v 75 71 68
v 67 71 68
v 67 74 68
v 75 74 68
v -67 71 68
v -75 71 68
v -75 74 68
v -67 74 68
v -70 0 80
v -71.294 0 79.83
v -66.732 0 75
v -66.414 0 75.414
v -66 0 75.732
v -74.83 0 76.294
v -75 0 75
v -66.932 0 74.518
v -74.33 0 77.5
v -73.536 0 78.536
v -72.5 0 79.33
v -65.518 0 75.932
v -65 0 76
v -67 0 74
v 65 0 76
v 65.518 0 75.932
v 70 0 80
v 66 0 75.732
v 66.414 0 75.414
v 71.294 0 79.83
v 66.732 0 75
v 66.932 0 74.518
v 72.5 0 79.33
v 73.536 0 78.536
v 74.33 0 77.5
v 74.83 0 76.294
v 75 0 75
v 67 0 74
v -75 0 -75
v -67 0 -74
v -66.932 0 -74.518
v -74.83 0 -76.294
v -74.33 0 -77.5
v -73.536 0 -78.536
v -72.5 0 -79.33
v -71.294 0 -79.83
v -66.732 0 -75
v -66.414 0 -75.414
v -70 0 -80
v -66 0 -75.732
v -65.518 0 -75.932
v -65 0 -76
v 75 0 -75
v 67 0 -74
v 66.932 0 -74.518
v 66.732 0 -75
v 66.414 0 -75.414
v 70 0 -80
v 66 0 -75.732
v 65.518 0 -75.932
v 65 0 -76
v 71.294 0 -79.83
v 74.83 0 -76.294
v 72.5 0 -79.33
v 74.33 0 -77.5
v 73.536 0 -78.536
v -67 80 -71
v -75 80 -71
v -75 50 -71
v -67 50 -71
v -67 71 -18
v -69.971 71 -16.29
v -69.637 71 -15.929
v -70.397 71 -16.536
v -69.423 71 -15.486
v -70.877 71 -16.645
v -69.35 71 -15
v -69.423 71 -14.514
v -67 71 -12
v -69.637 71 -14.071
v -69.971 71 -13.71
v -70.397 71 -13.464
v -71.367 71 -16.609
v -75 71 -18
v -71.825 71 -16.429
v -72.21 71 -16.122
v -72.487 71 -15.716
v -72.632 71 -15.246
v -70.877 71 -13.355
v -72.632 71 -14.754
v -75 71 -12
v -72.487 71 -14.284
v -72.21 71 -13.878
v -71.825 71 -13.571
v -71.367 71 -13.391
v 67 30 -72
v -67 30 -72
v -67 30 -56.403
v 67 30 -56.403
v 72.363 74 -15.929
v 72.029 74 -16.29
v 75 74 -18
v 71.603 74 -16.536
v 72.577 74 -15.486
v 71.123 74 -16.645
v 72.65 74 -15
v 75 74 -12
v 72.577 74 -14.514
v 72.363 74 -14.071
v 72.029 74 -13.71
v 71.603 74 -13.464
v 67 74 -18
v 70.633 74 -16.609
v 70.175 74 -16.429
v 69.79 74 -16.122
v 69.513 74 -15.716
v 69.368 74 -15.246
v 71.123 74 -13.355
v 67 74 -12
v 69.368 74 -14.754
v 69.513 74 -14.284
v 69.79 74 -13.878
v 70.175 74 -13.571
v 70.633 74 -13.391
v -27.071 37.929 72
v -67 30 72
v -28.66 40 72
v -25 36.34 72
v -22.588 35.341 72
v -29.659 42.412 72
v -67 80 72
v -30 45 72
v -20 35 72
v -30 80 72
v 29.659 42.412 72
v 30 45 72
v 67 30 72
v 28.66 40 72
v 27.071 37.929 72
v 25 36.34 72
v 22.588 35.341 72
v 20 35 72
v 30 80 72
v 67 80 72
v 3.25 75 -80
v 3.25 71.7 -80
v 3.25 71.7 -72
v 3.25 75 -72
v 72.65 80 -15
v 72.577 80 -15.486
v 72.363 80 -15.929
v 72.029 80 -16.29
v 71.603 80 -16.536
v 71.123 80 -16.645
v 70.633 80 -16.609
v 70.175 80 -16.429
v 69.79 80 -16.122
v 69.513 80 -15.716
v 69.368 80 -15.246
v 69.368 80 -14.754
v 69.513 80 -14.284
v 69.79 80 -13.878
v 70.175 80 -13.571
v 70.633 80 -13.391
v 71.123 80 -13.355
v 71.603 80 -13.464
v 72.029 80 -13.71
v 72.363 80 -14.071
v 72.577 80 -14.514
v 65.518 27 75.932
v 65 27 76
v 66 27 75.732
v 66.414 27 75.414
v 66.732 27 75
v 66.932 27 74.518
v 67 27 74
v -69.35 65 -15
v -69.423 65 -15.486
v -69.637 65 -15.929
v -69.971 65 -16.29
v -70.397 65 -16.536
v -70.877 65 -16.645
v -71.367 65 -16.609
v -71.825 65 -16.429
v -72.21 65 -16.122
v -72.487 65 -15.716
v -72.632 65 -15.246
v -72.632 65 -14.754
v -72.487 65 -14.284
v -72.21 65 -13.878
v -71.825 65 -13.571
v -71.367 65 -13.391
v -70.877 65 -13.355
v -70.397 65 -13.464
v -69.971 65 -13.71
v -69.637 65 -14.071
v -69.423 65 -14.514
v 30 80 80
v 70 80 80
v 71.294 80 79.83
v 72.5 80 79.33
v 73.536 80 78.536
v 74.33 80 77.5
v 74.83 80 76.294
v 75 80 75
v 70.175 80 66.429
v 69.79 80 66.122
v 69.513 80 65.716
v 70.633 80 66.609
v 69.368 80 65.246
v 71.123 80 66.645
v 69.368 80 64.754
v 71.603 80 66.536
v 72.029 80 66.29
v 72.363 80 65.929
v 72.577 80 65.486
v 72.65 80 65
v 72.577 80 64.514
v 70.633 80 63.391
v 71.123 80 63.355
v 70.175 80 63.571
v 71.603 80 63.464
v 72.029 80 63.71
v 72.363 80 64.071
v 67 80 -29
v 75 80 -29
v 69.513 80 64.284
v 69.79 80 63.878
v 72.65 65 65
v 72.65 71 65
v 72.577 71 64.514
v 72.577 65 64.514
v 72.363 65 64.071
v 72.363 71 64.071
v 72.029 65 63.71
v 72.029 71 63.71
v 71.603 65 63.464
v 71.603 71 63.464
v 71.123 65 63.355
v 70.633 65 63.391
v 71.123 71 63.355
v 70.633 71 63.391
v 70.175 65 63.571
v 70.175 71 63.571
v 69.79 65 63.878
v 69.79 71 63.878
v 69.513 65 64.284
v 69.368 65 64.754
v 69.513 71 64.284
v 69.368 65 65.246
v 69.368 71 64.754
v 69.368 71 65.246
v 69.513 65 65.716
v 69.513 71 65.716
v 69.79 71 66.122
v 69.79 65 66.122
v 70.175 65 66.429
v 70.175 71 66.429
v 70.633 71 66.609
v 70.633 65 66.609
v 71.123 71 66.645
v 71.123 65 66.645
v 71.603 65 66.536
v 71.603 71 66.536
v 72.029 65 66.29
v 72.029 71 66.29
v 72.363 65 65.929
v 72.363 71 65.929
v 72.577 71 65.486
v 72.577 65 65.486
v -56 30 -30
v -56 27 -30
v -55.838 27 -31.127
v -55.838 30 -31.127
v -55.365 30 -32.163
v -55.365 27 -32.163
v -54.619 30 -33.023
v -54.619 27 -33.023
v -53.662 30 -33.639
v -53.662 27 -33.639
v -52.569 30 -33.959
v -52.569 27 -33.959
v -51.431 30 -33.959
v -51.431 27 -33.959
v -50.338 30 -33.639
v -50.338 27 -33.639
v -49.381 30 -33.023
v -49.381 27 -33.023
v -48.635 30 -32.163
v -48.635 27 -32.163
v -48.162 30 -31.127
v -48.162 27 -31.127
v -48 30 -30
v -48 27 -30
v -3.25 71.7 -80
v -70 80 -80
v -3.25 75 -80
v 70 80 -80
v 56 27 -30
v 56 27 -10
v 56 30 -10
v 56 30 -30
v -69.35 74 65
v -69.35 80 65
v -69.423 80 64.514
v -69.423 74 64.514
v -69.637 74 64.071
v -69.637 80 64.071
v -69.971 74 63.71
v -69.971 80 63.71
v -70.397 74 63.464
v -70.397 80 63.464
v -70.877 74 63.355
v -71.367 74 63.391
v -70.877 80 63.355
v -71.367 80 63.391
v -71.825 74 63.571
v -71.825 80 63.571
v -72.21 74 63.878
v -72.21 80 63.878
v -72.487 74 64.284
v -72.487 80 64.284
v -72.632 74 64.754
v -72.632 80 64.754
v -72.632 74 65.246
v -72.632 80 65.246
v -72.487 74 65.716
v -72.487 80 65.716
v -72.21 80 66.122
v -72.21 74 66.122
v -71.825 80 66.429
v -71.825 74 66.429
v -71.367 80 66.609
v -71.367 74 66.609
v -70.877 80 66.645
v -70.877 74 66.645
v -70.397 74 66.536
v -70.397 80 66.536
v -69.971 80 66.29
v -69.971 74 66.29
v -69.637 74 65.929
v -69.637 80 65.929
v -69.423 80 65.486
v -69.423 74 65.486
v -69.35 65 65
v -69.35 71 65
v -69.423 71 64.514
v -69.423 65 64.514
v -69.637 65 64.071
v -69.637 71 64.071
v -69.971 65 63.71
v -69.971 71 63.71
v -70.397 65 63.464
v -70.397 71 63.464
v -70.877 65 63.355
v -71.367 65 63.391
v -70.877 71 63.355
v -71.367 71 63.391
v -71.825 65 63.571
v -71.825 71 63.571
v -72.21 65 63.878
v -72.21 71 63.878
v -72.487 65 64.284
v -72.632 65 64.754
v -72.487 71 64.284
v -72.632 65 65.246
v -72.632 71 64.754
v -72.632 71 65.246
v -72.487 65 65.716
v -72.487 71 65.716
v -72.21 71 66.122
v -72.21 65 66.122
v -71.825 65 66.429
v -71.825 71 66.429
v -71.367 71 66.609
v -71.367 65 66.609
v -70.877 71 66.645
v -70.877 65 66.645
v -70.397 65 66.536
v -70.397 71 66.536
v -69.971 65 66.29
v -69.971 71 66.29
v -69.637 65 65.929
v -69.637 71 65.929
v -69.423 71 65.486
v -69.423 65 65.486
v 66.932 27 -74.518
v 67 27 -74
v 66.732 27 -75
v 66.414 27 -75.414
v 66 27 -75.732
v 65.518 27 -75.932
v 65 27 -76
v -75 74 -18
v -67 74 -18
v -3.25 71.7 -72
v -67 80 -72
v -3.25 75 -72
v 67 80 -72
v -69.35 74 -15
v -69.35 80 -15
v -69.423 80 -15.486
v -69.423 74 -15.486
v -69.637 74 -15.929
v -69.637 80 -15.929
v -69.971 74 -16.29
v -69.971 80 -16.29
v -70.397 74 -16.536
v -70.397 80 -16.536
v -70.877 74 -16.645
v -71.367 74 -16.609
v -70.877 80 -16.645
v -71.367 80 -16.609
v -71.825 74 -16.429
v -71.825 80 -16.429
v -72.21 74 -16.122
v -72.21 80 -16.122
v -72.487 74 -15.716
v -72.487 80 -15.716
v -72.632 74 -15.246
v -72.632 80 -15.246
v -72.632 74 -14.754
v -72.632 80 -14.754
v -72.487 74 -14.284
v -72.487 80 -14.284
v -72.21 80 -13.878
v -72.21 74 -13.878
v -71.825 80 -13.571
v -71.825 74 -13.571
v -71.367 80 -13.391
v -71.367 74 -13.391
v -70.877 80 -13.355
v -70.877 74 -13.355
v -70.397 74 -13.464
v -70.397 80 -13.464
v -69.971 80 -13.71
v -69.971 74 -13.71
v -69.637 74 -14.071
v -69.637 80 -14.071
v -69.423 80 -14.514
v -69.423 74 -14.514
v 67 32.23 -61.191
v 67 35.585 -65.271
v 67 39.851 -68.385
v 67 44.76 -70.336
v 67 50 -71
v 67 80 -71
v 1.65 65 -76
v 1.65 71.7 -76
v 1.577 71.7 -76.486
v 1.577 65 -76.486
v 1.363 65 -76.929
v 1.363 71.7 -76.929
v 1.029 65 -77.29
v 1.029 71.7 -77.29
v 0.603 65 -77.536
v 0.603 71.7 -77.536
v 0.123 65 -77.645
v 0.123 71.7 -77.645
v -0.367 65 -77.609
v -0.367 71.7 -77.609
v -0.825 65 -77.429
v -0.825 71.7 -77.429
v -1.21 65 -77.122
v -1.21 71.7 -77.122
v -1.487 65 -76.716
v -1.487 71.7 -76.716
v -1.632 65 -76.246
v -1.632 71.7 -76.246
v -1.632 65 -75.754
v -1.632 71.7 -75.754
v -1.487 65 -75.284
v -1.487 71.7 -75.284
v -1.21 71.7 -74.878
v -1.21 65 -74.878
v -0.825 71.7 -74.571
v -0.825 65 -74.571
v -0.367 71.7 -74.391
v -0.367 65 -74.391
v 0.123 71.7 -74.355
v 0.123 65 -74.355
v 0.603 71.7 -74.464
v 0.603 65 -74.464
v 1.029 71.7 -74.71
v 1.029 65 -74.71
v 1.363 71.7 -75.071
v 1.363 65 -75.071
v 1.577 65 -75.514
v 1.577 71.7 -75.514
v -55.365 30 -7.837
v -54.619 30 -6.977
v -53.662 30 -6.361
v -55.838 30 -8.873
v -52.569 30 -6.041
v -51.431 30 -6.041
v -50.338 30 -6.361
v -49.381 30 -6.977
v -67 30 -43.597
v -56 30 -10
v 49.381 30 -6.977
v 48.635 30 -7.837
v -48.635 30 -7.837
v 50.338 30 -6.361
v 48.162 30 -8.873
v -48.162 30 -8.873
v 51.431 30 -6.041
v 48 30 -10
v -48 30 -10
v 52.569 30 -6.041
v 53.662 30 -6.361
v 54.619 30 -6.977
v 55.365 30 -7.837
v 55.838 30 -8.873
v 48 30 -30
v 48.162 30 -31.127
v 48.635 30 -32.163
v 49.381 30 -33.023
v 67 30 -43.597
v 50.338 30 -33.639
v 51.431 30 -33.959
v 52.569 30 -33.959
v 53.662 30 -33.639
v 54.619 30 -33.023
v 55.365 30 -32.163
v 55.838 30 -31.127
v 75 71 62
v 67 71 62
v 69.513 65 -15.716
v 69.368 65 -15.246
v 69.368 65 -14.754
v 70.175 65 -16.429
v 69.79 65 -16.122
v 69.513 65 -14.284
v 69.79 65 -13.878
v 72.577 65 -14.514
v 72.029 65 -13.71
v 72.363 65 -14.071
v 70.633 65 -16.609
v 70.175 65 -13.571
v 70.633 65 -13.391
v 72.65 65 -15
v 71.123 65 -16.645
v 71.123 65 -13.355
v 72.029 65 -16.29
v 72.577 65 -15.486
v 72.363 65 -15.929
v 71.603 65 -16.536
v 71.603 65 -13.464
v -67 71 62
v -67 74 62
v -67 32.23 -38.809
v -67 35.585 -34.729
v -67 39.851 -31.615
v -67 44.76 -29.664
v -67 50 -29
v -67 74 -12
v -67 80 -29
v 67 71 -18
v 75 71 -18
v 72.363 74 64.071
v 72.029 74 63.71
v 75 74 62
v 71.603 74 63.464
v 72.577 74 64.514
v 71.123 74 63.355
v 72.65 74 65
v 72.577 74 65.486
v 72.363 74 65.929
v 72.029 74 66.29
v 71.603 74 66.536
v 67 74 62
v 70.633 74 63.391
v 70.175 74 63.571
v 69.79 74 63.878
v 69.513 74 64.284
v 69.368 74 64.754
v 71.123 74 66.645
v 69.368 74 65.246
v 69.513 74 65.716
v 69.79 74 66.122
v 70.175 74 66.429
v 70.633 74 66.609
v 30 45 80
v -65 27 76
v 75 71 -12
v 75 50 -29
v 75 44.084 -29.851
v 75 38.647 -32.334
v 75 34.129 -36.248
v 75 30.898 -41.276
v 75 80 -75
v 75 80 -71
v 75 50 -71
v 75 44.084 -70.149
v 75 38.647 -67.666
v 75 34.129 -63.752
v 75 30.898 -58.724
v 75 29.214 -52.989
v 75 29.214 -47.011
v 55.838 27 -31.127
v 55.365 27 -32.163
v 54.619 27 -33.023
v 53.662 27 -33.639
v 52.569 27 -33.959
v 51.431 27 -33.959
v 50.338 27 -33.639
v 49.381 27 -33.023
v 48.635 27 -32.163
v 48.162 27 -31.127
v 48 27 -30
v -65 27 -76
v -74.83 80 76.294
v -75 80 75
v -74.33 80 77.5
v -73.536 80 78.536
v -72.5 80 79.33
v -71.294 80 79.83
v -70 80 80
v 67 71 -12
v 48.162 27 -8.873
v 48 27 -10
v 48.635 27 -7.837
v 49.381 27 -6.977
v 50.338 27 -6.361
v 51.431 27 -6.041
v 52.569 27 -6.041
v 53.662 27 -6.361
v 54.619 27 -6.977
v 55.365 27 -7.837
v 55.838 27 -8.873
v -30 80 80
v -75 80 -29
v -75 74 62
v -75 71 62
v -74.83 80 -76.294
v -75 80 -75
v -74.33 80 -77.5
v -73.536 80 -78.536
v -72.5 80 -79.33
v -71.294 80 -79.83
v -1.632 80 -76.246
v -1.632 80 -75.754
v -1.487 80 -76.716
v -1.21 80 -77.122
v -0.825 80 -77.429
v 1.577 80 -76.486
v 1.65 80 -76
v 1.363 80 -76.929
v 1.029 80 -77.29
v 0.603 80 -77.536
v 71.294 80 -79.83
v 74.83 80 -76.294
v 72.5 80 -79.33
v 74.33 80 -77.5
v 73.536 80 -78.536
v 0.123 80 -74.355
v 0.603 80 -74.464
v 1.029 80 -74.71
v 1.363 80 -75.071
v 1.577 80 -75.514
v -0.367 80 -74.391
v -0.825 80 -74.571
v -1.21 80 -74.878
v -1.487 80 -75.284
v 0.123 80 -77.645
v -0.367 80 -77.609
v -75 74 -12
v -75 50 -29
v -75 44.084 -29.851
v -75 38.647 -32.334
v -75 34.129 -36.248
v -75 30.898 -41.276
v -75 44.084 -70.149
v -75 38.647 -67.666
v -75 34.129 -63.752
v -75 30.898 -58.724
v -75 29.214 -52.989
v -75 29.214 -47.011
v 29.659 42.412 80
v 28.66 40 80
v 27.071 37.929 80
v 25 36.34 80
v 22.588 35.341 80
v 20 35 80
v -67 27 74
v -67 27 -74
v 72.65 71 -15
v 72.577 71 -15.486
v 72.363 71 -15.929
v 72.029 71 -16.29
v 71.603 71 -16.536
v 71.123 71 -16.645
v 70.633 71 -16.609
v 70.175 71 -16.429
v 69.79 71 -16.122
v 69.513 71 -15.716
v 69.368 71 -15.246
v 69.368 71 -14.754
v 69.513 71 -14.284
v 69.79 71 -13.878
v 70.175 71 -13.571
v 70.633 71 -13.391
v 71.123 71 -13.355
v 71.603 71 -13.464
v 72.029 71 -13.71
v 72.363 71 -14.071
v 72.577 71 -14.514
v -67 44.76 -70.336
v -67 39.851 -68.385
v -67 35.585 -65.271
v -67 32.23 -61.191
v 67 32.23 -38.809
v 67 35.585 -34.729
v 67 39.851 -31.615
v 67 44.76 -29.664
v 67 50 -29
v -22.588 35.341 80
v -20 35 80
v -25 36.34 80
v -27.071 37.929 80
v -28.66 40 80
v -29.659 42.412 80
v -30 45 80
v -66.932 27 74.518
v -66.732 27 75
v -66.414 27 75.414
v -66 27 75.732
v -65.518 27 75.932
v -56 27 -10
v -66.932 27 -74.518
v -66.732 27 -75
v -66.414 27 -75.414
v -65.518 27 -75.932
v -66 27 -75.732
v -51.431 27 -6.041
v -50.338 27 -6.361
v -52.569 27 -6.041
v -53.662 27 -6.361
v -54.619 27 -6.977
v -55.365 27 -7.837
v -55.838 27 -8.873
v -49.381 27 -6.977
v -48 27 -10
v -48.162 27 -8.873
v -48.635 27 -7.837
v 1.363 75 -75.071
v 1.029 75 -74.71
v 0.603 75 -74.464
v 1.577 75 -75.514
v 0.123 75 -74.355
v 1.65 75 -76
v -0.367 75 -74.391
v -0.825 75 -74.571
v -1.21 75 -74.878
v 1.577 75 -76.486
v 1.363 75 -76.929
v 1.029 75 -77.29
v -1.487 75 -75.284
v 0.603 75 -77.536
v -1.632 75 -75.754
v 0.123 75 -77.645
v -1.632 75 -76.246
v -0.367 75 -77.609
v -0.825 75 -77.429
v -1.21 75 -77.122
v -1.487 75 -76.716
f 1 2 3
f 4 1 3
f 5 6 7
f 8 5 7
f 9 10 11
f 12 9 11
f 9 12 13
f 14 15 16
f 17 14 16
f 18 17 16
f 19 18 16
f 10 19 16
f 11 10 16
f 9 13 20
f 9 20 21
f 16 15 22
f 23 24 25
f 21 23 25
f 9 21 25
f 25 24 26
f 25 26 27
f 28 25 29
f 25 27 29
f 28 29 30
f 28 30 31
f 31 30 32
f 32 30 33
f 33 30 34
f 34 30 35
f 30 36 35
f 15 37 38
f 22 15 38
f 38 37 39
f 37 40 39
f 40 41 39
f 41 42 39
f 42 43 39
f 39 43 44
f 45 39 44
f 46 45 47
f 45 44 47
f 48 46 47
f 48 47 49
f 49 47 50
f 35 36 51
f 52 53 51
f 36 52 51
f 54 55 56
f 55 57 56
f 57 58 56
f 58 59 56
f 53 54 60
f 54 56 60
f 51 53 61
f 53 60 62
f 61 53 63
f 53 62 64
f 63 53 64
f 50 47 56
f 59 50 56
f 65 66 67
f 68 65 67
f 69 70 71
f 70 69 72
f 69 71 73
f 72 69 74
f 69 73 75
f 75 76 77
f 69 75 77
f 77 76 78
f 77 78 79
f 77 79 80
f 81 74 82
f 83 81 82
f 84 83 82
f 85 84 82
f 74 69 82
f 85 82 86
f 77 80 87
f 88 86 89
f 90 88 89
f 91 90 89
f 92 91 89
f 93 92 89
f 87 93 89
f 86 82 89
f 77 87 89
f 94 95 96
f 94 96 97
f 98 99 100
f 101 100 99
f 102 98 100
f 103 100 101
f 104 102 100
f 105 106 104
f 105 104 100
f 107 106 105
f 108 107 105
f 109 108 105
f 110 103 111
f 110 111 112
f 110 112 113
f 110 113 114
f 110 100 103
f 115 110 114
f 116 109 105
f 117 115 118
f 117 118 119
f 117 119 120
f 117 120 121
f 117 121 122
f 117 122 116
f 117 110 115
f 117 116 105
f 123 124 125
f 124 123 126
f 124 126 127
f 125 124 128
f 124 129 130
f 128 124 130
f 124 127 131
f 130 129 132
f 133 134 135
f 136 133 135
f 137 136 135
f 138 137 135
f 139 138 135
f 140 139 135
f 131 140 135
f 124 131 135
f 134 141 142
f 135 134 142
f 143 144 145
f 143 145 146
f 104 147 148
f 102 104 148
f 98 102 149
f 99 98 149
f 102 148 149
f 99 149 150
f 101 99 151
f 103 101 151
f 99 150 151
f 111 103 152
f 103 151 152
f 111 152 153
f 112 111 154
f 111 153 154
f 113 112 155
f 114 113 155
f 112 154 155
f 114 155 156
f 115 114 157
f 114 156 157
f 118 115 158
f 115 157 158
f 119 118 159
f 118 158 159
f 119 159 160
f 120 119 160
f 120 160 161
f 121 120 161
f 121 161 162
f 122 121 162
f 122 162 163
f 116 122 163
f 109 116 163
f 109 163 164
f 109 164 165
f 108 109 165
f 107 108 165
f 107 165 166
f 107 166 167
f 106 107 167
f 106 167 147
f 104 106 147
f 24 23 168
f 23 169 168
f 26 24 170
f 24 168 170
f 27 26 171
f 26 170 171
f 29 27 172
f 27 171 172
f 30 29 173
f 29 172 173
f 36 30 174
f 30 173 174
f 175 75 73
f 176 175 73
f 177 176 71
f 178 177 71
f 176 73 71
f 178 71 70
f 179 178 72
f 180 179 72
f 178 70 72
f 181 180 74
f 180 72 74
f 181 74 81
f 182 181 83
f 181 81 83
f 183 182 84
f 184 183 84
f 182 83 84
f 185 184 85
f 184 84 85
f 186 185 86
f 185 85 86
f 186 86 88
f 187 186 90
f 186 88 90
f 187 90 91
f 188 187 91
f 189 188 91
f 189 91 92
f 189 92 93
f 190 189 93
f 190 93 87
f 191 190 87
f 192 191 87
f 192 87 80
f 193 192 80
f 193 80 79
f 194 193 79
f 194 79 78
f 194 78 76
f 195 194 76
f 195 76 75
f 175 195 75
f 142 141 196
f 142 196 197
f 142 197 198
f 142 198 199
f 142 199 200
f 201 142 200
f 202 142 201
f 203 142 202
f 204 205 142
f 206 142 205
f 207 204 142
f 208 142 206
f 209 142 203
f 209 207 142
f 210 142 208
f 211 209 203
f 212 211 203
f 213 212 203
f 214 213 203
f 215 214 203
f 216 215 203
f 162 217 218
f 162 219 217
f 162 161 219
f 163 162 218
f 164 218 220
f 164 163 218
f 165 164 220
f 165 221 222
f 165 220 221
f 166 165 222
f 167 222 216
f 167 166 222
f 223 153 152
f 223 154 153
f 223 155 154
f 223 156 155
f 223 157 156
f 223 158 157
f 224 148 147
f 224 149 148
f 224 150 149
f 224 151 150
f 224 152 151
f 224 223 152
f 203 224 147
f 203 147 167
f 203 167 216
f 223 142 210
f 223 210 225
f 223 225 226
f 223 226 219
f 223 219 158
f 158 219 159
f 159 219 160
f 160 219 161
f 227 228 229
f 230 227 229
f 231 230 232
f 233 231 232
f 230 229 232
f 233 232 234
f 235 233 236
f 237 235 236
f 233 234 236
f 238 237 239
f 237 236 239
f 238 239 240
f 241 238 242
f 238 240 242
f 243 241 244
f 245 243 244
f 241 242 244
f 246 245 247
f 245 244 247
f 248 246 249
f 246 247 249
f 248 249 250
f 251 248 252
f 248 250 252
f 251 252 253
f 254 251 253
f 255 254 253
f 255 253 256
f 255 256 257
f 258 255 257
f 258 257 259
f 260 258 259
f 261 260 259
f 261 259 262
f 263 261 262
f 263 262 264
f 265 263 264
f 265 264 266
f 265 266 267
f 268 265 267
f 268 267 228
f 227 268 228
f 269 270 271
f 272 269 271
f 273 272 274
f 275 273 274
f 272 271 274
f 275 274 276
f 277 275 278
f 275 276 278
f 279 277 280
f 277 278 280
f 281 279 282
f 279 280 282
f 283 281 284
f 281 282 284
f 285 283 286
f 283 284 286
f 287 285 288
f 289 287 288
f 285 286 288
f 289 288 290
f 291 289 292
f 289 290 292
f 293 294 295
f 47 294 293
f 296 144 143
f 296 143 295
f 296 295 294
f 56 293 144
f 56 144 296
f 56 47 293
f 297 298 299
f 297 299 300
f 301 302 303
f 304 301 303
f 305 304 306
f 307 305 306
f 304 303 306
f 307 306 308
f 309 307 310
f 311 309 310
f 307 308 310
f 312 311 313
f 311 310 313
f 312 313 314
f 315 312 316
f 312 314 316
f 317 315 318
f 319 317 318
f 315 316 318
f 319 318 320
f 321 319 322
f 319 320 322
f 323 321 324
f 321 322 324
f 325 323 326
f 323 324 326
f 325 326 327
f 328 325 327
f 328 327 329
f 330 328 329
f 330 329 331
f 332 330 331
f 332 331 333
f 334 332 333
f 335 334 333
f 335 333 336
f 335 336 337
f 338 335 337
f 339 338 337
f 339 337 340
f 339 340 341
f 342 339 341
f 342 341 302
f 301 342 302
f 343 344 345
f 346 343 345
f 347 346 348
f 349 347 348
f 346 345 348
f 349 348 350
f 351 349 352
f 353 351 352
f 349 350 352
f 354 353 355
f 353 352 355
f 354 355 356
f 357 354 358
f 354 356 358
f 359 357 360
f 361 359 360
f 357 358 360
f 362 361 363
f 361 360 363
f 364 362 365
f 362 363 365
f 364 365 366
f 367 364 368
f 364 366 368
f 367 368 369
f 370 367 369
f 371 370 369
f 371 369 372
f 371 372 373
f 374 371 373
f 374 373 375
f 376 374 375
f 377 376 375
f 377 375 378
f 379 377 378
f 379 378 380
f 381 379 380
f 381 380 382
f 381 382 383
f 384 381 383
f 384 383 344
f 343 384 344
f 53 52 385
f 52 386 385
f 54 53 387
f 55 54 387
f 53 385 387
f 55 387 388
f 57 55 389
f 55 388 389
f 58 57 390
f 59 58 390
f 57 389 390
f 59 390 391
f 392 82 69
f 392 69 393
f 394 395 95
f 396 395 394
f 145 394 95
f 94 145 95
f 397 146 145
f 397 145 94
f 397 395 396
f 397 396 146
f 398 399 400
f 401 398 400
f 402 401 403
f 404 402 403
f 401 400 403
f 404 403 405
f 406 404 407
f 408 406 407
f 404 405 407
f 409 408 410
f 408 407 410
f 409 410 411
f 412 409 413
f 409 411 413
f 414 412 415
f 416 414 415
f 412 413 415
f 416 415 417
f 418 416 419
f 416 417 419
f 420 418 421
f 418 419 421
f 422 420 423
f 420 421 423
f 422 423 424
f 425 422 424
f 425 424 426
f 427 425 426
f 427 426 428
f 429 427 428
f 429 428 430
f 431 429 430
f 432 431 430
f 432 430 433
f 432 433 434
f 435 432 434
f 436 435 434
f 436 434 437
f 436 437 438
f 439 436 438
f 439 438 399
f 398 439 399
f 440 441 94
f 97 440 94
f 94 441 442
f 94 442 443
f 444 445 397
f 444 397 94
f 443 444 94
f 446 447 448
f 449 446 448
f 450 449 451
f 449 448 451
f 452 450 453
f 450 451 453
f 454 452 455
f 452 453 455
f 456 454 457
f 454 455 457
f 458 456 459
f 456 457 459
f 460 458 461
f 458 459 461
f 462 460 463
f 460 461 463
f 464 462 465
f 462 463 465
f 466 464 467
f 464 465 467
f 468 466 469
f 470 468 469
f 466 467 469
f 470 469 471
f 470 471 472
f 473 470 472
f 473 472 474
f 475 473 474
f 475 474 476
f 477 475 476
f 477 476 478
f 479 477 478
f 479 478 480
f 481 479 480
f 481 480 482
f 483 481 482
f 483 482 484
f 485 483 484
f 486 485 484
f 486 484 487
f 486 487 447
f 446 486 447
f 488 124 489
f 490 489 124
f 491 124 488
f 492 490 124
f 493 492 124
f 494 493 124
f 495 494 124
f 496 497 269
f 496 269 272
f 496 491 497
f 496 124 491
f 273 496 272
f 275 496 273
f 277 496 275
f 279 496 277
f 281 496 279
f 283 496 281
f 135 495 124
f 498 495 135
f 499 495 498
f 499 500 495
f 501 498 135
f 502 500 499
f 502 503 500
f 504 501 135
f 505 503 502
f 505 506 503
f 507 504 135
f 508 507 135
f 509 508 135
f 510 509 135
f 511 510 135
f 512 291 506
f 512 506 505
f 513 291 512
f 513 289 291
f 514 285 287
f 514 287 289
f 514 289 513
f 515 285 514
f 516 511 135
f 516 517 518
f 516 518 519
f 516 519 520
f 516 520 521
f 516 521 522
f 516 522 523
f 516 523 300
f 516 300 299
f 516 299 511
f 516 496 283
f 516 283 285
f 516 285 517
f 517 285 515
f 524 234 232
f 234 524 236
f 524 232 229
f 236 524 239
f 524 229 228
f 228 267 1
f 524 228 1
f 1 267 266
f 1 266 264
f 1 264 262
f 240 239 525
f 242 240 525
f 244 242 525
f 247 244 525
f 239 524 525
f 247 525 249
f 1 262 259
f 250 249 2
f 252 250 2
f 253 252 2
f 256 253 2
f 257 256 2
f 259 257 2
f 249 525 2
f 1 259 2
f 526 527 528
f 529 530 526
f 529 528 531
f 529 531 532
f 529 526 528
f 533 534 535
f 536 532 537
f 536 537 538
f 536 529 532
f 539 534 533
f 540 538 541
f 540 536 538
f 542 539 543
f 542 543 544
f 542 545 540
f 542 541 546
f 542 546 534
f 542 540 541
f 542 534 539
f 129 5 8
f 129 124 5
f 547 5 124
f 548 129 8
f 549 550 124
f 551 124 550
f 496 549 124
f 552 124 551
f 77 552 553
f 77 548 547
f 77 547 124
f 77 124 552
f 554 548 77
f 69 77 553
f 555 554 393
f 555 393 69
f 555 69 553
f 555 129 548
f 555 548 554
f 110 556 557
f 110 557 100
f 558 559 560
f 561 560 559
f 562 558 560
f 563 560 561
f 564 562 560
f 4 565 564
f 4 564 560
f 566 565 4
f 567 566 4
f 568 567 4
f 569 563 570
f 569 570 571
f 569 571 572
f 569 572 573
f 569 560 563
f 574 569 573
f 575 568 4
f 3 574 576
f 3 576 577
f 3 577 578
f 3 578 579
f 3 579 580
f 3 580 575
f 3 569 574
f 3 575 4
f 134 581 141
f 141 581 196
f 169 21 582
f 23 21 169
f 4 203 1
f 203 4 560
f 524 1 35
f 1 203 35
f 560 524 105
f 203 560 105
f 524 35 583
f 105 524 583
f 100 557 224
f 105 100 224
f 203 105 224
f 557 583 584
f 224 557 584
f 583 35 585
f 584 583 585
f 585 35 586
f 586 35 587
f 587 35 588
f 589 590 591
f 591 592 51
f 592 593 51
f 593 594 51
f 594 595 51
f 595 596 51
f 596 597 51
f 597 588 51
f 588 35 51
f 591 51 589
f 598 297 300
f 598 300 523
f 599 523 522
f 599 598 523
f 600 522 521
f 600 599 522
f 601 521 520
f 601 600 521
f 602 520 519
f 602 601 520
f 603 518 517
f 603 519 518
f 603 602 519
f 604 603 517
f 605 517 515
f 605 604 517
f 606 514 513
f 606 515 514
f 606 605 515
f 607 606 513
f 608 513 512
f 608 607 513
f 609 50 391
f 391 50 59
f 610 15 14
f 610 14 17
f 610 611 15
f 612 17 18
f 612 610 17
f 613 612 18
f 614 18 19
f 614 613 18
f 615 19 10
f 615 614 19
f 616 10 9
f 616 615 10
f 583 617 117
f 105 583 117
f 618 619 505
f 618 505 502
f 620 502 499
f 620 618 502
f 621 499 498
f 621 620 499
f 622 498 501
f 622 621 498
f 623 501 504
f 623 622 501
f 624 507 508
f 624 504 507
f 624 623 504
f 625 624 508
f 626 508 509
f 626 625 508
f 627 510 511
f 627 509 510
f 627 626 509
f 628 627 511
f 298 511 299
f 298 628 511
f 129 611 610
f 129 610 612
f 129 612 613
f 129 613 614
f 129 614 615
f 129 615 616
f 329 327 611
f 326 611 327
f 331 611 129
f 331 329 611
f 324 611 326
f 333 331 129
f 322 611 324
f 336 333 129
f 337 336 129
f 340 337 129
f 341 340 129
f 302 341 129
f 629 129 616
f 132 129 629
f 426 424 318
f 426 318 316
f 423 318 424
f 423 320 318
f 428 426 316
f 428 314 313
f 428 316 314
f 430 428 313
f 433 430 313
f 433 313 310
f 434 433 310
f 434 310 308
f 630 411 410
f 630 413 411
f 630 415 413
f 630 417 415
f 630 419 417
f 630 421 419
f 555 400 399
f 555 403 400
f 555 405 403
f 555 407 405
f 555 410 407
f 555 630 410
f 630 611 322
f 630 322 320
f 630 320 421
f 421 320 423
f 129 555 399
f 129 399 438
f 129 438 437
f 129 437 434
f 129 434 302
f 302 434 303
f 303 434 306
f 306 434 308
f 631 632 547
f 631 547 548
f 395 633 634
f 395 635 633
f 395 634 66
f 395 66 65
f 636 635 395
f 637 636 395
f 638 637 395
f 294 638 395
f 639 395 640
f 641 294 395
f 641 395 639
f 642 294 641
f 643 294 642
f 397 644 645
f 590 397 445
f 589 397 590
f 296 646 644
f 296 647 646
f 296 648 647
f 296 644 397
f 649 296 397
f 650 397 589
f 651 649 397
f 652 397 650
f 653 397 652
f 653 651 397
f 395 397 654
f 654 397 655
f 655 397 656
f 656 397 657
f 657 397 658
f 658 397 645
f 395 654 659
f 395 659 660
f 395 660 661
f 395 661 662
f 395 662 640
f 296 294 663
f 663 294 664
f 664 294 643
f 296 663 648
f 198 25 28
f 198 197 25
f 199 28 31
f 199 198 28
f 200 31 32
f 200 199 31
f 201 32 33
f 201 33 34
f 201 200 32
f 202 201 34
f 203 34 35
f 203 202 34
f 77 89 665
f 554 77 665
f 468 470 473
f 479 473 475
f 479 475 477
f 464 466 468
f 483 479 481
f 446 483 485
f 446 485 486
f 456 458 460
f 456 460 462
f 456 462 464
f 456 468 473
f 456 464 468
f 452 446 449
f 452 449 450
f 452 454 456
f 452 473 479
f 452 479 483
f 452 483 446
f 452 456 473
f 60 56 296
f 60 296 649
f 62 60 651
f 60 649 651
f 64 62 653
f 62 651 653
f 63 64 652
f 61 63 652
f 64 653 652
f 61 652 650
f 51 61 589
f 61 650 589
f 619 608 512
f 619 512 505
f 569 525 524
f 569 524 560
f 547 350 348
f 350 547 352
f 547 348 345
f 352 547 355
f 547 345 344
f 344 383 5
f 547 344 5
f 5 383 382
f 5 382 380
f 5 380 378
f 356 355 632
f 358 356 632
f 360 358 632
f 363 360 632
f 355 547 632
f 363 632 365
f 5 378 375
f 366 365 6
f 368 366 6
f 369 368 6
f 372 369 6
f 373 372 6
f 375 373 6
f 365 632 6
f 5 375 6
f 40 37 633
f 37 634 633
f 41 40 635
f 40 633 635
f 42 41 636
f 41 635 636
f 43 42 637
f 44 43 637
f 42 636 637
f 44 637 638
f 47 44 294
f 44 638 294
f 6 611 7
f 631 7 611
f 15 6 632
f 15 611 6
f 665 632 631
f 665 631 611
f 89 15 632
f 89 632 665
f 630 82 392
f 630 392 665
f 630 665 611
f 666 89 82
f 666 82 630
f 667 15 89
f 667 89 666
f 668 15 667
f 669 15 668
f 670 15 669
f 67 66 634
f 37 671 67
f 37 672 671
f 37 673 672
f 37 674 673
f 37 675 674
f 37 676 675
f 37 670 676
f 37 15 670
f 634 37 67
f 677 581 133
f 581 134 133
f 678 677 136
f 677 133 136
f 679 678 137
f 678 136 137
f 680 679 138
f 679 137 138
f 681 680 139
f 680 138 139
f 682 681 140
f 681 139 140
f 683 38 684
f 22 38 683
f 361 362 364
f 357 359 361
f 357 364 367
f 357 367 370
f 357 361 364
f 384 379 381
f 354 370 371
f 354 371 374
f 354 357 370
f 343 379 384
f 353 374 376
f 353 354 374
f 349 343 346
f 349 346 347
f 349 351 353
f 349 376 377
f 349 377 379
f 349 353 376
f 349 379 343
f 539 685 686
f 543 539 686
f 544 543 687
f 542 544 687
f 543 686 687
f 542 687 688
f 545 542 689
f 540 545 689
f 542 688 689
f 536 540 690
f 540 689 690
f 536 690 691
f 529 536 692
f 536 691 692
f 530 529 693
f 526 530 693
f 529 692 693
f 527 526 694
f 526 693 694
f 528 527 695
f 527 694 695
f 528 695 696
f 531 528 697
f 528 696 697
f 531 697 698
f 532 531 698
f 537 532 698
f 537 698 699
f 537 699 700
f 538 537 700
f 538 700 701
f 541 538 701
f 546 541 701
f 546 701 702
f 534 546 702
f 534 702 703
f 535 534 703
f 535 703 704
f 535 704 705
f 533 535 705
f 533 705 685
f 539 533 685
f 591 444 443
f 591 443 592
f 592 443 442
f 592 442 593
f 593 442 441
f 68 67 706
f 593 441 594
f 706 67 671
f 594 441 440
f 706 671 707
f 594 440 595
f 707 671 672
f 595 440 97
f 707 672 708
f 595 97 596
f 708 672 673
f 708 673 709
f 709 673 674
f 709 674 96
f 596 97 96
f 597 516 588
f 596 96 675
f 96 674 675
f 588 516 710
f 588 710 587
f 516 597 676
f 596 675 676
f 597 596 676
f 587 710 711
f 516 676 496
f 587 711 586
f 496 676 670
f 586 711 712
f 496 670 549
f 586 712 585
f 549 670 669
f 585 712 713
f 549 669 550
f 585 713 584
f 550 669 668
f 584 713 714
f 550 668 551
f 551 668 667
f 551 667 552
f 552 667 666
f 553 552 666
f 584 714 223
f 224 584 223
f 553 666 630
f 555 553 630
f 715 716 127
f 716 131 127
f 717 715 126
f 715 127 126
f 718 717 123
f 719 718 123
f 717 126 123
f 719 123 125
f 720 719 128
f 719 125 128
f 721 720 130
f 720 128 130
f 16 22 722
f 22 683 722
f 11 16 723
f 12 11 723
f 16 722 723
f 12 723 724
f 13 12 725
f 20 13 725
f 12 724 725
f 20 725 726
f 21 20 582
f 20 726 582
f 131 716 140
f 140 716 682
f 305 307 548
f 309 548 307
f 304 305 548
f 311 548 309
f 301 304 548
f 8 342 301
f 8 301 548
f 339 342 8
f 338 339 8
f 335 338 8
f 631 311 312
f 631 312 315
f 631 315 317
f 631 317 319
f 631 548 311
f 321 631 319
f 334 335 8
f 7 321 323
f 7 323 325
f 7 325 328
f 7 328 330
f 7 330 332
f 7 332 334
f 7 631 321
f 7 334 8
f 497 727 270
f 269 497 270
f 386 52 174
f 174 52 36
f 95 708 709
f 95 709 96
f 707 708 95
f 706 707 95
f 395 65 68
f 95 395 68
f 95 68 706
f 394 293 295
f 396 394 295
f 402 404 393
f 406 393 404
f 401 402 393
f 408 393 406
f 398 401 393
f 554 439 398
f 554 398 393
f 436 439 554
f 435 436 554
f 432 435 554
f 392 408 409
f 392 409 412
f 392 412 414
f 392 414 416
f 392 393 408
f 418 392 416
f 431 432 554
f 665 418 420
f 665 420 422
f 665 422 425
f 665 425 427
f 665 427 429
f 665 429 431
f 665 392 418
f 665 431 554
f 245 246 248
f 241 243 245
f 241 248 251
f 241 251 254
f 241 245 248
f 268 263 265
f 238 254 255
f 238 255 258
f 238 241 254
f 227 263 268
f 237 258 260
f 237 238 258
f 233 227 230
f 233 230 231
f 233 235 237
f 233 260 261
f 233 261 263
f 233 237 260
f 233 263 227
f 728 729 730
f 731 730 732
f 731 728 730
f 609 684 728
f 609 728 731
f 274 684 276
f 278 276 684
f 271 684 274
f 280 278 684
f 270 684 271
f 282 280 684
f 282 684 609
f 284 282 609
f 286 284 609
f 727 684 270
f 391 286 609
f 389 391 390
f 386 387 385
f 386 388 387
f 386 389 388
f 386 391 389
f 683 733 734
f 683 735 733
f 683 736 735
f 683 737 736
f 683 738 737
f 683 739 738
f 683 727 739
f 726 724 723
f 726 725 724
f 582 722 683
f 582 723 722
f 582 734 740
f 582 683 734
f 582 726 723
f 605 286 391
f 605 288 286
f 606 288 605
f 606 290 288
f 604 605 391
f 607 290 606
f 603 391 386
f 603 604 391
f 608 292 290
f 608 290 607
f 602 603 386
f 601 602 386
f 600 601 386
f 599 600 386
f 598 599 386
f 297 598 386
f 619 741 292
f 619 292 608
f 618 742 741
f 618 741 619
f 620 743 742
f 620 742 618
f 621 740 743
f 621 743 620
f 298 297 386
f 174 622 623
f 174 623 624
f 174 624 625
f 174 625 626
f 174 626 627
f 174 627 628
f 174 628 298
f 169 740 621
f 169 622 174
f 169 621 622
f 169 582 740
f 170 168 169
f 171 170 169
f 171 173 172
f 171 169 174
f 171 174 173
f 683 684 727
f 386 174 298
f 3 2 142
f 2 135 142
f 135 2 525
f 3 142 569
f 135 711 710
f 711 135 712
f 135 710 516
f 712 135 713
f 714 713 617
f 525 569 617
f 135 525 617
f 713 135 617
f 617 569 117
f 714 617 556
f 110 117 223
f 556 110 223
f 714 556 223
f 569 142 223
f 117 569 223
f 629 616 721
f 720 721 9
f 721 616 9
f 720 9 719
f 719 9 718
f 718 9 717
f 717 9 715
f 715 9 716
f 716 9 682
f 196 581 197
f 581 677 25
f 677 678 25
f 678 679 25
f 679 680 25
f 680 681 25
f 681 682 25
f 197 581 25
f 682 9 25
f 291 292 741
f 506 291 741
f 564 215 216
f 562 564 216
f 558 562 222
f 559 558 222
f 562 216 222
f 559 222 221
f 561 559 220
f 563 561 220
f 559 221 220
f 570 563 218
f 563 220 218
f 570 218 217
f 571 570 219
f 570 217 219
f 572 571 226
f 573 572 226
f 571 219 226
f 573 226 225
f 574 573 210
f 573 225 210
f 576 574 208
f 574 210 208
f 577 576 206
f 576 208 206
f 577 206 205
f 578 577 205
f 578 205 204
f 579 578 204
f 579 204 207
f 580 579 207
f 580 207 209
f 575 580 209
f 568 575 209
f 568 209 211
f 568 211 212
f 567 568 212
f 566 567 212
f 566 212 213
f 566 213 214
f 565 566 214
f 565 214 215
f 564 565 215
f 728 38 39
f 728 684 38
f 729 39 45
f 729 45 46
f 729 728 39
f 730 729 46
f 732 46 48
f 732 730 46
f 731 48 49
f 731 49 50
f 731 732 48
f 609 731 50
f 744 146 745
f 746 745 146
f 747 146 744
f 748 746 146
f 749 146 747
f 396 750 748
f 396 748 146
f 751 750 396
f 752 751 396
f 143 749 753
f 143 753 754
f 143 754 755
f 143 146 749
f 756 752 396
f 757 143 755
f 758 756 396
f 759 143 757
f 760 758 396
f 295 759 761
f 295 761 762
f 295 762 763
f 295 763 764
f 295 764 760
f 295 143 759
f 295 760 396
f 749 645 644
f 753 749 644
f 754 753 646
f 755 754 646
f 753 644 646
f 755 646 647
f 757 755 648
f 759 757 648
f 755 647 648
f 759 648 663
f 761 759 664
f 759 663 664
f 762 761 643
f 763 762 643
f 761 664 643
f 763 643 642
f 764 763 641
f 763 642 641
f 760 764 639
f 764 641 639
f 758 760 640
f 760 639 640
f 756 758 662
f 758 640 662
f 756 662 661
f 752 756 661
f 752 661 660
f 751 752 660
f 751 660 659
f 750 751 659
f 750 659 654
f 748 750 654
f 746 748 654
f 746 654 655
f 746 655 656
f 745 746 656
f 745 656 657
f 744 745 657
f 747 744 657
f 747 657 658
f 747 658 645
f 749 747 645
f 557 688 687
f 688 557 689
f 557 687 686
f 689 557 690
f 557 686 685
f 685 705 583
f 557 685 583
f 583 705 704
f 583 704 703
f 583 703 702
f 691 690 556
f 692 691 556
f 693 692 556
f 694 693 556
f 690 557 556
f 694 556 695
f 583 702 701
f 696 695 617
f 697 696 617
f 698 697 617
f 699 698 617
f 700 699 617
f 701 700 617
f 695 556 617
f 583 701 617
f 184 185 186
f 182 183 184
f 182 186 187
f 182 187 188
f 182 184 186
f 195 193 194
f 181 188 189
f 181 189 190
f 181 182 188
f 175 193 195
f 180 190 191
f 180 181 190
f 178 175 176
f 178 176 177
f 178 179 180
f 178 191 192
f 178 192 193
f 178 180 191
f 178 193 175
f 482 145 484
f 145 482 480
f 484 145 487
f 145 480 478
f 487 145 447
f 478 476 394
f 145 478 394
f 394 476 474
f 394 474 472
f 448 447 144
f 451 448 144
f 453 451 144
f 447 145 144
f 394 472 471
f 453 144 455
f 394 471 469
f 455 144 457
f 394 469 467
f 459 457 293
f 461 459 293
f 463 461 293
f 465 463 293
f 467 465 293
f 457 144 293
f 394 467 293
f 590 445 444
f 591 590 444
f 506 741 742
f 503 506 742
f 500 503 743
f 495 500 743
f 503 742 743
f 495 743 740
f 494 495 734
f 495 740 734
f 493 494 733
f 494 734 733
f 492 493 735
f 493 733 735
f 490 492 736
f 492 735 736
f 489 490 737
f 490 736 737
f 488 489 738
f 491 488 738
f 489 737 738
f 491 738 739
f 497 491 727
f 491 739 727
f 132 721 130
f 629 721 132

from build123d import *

# Parameters (mm, degrees)
SKETCH_1_W           = 150
SKETCH_1_H           = 160
EXTRUDE_1_DEPTH      = 80
CUT_EXTRUDE_1_DEPTH  = 151
FILLET_1_R           = 5
SKETCH_3_W           = 134
SKETCH_3_H           = 152
CUT_EXTRUDE_2_DEPTH  = 27
SKETCH_4_W           = 134
SKETCH_4_H           = 144
CUT_EXTRUDE_3_DEPTH  = 50
SKETCH_5_W           = 60
SKETCH_5_H           = 45
CUT_EXTRUDE_4_DEPTH  = 50
FILLET_2_R           = 2
SKETCH_7_R           = 1.65
CUT_EXTRUDE_6_DEPTH  = 15
SKETCH_9_W           = 6
SKETCH_9_H           = 3
CUT_EXTRUDE_7_DEPTH  = 151
SKETCH_11_R          = 1.65
CUT_EXTRUDE_8_DEPTH  = 15
SKETCH_12_W          = 6.5
SKETCH_12_H          = 3.3
CUT_EXTRUDE_9_DEPTH  = 15
FILLET_3_R           = 10
CUT_EXTRUDE_10_DEPTH = 54


with BuildPart() as part:
    # 草图1 → 凸台-拉伸1 (new body)
    with BuildSketch(Plane(origin=(0, 0, 0), x_dir=(1, 0, 0), z_dir=(0, 1, 0))):
        Rectangle(SKETCH_1_W, SKETCH_1_H)
    extrude(amount=EXTRUDE_1_DEPTH)

    # 草图2 → 切除-拉伸1 (cut, through all)
    with BuildSketch(Plane.ZY.offset(75)):
        with BuildLine():
            Line((-29, 50), (-29, 80))
            Line((-29, 80), (-71, 80))
            Line((-71, 80), (-71, 50))
            ThreePointArc((-71, 50), (-50, 29), (-29, 50))
        make_face()
    extrude(amount=-CUT_EXTRUDE_1_DEPTH, mode=Mode.SUBTRACT)

    # 圆角1
    fillet_1_edges = [part.edges().sort_by_distance(p)[0] for p in [
        (75, 40, 80),
        (-75, 40, 80),
        (-75, 40, -80),
        (75, 40, -80),
    ]]
    fillet(fillet_1_edges, radius=FILLET_1_R)

    # 草图3 → 切除-拉伸2 (cut)
    with BuildSketch(Plane.XZ):
        Rectangle(SKETCH_3_W, SKETCH_3_H)
    extrude(amount=-CUT_EXTRUDE_2_DEPTH, mode=Mode.SUBTRACT)

    # 草图4 → 切除-拉伸3 (cut)
    with BuildSketch(Plane(origin=(0, 80, 0), x_dir=(1, 0, 0), z_dir=(0, 1, 0))):
        Rectangle(SKETCH_4_W, SKETCH_4_H)
    extrude(amount=-CUT_EXTRUDE_3_DEPTH, mode=Mode.SUBTRACT)

    # 草图5 → 切除-拉伸4 (cut)
    with BuildSketch(Plane.XY.offset(80)):
        with Locations((0, 57.5)):
            Rectangle(SKETCH_5_W, SKETCH_5_H)
    extrude(amount=-CUT_EXTRUDE_4_DEPTH, mode=Mode.SUBTRACT)

    # 圆角2
    fillet_2_edges = [part.edges().sort_by_distance(p)[0] for p in [
        (-67, 13.5, -76),
        (-67, 13.5, 76),
        (67, 13.5, 76),
        (67, 13.5, -76),
    ]]
    fillet(fillet_2_edges, radius=FILLET_2_R)

    # 草图7 → 切除-拉伸6 (cut)
    with BuildSketch(Plane(origin=(0, 80, 0), x_dir=(1, 0, 0), z_dir=(0, 1, 0))):
        with Locations((-71, -65)):
            Circle(SKETCH_7_R)
        with Locations((-71, 15)):
            Circle(SKETCH_7_R)
        with Locations((71, -65)):
            Circle(SKETCH_7_R)
        with Locations((71, 15)):
            Circle(SKETCH_7_R)
    extrude(amount=-CUT_EXTRUDE_6_DEPTH, mode=Mode.SUBTRACT)

    # 草图9 → 切除-拉伸7 (cut, through all)
    with BuildSketch(Plane.ZY.offset(75)):
        with Locations((65, 72.5)):
            Rectangle(SKETCH_9_W, SKETCH_9_H)
        with Locations((-15, 72.5)):
            Rectangle(SKETCH_9_W, SKETCH_9_H)
    extrude(amount=-CUT_EXTRUDE_7_DEPTH, mode=Mode.SUBTRACT)

    # 草图11 → 切除-拉伸8 (cut)
    with BuildSketch(Plane(origin=(0, 80, 0), x_dir=(1, 0, 0), z_dir=(0, 1, 0))):
        with Locations((0, 76)):
            Circle(SKETCH_11_R)
    extrude(amount=-CUT_EXTRUDE_8_DEPTH, mode=Mode.SUBTRACT)

    # 草图12 → 切除-拉伸9 (cut)
    with BuildSketch(Plane(origin=(0, 0, -80), x_dir=(-1, 0, 0), z_dir=(0, 0, -1))):
        with Locations((0, 73.35)):
            Rectangle(SKETCH_12_W, SKETCH_12_H)
    extrude(amount=-CUT_EXTRUDE_9_DEPTH, mode=Mode.SUBTRACT)

    # 圆角3
    fillet_3_edges = [part.edges().sort_by_distance(p)[0] for p in [
        (-30, 35, 76),
        (30, 35, 76),
    ]]
    fillet(fillet_3_edges, radius=FILLET_3_R)

    # 草图13 → 切除-拉伸10 (cut, through all)
    with BuildSketch(Plane.XZ.offset(-27)):
        with BuildLine():
            Line((56, -10), (56, -30))
            ThreePointArc((56, -30), (52, -34), (48, -30))
            Line((48, -30), (48, -10))
            ThreePointArc((48, -10), (52, -6), (56, -10))
        make_face()
        with BuildLine():
            Line((-56, -10), (-56, -30))
            ThreePointArc((-56, -30), (-52, -34), (-48, -30))
            Line((-48, -30), (-48, -10))
            ThreePointArc((-48, -10), (-52, -6), (-56, -10))
        make_face()
    extrude(amount=-CUT_EXTRUDE_10_DEPTH, mode=Mode.SUBTRACT)


solid = part.part
